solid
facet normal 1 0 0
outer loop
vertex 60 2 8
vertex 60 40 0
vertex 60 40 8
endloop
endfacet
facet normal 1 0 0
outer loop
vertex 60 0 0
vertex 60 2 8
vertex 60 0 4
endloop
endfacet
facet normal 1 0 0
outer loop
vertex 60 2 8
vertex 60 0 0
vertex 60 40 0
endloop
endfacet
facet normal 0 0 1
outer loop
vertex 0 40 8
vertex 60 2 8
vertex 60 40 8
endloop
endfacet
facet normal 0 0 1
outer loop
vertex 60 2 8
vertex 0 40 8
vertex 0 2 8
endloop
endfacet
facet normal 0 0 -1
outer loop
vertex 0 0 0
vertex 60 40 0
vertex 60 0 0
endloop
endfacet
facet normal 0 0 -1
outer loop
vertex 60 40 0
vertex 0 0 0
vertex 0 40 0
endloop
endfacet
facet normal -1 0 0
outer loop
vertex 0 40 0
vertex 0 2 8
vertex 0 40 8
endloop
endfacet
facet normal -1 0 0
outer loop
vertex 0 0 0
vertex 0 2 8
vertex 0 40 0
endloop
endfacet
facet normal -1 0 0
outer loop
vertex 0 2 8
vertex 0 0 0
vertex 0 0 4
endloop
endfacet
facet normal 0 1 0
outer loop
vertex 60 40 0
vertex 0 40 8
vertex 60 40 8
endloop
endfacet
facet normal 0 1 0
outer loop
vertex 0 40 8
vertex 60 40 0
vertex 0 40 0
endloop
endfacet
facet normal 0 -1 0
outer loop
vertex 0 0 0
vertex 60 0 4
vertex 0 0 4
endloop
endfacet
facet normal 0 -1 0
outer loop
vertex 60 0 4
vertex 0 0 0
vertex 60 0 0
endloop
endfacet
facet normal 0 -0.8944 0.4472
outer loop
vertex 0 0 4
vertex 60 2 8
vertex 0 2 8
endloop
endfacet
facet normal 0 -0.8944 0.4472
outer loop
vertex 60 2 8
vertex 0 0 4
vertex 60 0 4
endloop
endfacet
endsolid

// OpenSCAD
// Unequal setbacks; this must never become a symmetric chamfer slider.
$fn = 64;
body_length = 60;
body_width = 40;
body_height = 8;
top_setback = 2;
front_setback = 4;

module asymmetric_chamfer_block(body_length=60, body_width=40, body_height=8,
                                 top_setback=2, front_setback=4) {
    assert(min(body_length,body_width,body_height,top_setback,front_setback)>0);
    assert(top_setback<body_width && front_setback<body_height);
    difference() {
        cube([body_length,body_width,body_height]);
        multmatrix([[0,0,1,-1],[1,0,0,0],[0,1,0,0],[0,0,0,1]])
            linear_extrude(height=body_length+2)
                polygon([[0,body_height],[top_setback,body_height],
                         [0,body_height-front_setback]]);
    }
}

asymmetric_chamfer_block(body_length,body_width,body_height,top_setback,front_setback);
